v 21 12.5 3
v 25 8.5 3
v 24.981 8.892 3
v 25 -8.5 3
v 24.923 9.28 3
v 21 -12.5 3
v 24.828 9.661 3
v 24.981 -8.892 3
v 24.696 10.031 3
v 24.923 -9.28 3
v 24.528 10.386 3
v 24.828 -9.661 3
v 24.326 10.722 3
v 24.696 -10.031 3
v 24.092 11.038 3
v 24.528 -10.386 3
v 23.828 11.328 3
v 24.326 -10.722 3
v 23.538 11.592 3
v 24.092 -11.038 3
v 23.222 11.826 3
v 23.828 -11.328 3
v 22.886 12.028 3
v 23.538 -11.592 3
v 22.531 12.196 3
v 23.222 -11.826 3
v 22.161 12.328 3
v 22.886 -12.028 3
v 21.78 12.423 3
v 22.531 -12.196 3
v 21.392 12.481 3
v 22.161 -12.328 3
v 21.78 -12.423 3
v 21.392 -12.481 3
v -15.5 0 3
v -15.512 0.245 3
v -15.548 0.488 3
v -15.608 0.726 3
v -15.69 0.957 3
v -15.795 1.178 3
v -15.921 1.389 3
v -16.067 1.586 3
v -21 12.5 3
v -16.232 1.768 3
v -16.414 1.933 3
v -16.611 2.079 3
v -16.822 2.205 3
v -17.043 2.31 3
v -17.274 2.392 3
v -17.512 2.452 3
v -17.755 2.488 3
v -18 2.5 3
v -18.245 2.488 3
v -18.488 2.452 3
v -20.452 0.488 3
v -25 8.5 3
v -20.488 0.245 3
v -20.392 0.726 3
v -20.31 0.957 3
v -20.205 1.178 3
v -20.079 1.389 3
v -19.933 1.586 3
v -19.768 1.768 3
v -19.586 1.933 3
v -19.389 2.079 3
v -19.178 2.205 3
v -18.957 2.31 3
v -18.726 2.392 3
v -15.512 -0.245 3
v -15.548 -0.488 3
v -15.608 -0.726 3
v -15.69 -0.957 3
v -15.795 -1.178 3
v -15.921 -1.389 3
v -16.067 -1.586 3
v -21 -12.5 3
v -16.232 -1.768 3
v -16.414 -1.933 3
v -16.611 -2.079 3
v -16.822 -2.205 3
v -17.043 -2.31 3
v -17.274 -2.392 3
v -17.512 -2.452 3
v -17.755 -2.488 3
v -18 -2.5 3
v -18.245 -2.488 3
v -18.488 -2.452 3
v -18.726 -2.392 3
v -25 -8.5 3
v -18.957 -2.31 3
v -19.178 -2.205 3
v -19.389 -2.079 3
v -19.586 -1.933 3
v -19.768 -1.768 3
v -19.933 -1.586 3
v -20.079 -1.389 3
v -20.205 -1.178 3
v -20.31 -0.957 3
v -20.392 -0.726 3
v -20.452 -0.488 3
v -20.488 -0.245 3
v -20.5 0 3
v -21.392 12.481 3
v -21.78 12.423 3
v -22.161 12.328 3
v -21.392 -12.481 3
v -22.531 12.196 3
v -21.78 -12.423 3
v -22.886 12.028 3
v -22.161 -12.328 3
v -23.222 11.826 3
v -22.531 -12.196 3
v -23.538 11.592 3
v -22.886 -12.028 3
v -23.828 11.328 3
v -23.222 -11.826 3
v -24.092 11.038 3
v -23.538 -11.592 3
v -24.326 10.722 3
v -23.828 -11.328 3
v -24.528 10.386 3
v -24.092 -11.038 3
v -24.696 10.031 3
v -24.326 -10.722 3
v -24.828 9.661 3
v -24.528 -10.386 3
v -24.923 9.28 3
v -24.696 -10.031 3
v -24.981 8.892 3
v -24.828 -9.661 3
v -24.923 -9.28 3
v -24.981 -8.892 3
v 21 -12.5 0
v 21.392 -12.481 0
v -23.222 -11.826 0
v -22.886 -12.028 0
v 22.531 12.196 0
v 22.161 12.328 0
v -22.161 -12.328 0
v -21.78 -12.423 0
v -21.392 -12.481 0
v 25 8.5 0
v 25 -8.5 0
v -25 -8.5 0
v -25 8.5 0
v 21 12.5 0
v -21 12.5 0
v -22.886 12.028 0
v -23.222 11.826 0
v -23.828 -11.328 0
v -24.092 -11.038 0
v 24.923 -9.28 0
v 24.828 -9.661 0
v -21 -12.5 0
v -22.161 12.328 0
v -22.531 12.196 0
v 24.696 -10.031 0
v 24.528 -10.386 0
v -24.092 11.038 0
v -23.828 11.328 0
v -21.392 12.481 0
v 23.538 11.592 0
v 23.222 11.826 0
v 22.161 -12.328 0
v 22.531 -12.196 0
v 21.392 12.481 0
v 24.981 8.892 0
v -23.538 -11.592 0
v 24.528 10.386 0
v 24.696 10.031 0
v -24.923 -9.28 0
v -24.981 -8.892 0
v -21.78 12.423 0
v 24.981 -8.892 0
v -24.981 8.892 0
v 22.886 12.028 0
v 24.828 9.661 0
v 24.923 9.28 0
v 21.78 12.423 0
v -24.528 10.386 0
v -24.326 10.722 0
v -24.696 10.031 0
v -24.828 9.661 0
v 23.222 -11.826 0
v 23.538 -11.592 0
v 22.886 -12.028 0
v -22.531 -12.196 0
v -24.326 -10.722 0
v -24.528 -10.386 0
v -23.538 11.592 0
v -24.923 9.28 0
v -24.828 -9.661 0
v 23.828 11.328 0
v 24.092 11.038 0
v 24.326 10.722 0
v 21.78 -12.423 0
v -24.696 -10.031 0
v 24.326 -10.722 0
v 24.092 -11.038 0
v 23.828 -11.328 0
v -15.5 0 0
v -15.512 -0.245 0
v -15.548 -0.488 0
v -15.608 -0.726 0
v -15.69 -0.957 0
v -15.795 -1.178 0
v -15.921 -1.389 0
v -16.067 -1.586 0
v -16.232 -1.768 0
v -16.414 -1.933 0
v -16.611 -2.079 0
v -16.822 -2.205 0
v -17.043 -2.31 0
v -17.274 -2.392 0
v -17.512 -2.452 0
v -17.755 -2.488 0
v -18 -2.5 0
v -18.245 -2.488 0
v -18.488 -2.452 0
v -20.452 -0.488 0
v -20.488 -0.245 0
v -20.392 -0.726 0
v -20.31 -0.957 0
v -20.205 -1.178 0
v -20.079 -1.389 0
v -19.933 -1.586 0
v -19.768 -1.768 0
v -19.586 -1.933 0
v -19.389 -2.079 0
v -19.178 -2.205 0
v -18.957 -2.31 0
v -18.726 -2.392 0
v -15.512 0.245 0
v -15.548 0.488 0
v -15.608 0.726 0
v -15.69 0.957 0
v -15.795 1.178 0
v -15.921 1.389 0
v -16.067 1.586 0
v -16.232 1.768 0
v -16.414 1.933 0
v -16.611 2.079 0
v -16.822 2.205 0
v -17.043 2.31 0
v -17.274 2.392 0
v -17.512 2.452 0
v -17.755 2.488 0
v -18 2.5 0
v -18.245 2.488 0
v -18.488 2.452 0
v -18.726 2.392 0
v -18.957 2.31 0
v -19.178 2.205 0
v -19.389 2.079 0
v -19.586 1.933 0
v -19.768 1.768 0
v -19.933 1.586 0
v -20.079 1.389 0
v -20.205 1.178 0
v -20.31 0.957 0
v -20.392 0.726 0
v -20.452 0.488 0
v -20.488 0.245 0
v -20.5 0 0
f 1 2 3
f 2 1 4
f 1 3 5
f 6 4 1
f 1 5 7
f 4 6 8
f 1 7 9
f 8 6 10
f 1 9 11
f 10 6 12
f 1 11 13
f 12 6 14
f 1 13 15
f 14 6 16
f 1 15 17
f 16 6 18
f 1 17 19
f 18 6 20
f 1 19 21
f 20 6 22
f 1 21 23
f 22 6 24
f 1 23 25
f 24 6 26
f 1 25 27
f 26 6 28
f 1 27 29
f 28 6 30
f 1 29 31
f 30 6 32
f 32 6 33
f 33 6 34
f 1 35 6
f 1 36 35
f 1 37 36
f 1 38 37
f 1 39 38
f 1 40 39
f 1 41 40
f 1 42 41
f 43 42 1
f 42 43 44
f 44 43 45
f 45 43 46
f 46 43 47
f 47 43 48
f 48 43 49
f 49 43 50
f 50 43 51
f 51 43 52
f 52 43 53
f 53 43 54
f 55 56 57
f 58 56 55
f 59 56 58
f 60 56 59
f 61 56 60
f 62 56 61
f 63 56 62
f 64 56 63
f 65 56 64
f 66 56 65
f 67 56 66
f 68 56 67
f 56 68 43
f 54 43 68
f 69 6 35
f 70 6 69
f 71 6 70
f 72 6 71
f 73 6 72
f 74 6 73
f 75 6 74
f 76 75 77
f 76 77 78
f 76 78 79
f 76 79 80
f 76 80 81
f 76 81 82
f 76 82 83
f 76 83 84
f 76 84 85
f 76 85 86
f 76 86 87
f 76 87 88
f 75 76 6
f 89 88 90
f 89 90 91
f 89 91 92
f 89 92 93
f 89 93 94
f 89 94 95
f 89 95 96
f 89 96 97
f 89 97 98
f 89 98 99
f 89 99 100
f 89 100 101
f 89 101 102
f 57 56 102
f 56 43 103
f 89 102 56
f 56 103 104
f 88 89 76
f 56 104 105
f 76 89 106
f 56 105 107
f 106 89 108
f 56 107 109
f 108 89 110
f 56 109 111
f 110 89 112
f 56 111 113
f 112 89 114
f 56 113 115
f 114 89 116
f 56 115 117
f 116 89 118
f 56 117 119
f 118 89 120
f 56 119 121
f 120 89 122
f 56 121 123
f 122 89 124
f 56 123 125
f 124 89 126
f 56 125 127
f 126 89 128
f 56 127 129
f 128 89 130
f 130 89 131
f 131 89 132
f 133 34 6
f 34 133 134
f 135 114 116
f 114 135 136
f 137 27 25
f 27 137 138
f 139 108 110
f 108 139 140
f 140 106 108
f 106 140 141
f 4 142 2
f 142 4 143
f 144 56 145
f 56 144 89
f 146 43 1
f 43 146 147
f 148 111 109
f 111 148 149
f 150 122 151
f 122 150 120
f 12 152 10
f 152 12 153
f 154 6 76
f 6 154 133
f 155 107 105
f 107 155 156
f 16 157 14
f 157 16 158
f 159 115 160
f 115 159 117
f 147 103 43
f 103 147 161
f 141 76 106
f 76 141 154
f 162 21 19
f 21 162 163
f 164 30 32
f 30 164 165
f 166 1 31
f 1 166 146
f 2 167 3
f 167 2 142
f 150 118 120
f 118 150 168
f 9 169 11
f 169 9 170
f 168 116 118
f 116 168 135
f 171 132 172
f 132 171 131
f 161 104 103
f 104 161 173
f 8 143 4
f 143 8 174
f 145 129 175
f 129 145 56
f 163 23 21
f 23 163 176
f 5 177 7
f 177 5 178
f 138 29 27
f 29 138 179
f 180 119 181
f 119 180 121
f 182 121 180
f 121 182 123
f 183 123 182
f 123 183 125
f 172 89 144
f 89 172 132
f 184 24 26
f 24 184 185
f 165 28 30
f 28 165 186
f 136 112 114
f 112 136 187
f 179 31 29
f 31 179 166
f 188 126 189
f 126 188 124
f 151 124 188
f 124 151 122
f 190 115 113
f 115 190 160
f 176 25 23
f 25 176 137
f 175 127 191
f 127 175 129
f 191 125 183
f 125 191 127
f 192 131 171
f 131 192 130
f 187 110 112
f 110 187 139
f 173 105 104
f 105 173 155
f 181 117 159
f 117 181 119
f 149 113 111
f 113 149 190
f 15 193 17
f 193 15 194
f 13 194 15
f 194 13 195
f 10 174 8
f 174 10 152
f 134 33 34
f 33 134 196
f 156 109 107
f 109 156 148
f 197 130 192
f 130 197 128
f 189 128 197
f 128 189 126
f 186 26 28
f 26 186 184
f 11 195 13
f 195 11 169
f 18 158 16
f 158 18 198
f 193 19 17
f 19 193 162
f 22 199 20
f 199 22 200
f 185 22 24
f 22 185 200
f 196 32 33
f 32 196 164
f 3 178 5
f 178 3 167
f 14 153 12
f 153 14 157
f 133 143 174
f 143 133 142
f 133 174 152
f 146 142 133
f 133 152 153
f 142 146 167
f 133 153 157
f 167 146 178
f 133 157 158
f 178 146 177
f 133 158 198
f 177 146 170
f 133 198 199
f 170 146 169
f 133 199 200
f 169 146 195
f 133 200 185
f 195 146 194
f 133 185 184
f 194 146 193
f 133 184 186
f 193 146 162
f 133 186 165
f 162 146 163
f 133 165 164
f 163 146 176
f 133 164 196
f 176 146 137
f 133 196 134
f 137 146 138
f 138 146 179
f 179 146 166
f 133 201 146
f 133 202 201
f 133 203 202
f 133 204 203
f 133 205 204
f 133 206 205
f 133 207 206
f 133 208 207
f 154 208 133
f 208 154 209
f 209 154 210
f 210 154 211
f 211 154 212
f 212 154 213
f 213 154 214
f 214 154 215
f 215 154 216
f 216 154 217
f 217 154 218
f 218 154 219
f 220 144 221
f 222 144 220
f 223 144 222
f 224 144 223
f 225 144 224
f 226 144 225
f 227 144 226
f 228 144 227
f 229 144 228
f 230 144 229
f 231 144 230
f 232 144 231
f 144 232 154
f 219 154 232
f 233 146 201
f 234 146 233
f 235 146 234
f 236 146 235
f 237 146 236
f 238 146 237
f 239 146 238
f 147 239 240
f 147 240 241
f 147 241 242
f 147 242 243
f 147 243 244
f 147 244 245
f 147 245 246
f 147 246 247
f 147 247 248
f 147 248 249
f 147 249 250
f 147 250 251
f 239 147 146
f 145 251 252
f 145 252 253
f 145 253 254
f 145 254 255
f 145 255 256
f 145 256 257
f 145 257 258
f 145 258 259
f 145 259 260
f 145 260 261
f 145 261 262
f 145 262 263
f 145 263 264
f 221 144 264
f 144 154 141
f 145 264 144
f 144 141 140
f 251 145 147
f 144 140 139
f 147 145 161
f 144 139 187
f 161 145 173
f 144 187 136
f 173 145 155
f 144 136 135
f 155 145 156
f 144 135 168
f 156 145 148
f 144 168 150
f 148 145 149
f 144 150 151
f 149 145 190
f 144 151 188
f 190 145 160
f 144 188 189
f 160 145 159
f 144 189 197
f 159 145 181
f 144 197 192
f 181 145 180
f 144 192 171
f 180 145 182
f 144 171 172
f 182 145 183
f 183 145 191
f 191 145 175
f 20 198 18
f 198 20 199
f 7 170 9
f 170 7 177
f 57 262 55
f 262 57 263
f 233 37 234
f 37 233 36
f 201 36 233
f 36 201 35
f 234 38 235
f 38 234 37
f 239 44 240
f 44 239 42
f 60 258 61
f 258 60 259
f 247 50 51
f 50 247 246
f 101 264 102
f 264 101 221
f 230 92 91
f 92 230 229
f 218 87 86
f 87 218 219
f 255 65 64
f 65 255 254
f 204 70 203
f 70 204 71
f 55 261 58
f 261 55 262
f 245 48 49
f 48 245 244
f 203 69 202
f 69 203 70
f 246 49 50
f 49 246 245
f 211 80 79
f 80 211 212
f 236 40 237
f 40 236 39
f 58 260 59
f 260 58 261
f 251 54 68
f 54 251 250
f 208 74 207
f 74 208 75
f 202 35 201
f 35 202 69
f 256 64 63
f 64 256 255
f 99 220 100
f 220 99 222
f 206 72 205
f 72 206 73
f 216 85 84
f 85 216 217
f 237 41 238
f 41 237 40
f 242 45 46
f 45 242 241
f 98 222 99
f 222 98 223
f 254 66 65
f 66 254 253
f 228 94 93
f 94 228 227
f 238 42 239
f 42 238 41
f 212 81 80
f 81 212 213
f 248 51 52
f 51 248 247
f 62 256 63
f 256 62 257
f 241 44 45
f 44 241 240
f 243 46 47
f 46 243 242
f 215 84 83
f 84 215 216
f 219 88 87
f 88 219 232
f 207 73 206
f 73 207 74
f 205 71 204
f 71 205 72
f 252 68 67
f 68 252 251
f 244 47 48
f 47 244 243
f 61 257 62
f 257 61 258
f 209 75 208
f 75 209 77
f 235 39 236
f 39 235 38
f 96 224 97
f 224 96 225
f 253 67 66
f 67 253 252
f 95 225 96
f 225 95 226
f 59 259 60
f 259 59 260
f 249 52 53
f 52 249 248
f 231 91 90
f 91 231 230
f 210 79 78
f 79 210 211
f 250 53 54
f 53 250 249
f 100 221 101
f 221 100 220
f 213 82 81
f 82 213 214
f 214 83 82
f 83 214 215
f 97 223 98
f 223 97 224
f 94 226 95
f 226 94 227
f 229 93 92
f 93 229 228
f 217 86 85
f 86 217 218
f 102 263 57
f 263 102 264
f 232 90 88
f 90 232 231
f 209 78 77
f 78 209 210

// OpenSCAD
// file: ../lib/shapes.scad
// Reusable primitives shared by models in this workspace.

// A box with rounded vertical corners, centered on the XY plane.
module rounded_box(size = [40, 24, 3], radius = 3) {
    assert(radius > 0, "radius must be positive");
    assert(size.x > radius * 2 && size.y > radius * 2,
           "radius must fit within the box");

    linear_extrude(height = size.z)
        offset(r = radius)
            square([size.x - radius * 2, size.y - radius * 2], center = true);
}
// main file
use <../lib/shapes.scad>

// A small first model that exercises shared modules and common print features.
$fn = 64;

tag_size = [50, 25, 3];
corner_radius = 4;
hole_diameter = 5;
hole_inset = 7;

difference() {
    rounded_box(tag_size, corner_radius);

    translate([-(tag_size.x / 2) + hole_inset, 0, -0.5])
        cylinder(h = tag_size.z + 1, d = hole_diameter);
}
